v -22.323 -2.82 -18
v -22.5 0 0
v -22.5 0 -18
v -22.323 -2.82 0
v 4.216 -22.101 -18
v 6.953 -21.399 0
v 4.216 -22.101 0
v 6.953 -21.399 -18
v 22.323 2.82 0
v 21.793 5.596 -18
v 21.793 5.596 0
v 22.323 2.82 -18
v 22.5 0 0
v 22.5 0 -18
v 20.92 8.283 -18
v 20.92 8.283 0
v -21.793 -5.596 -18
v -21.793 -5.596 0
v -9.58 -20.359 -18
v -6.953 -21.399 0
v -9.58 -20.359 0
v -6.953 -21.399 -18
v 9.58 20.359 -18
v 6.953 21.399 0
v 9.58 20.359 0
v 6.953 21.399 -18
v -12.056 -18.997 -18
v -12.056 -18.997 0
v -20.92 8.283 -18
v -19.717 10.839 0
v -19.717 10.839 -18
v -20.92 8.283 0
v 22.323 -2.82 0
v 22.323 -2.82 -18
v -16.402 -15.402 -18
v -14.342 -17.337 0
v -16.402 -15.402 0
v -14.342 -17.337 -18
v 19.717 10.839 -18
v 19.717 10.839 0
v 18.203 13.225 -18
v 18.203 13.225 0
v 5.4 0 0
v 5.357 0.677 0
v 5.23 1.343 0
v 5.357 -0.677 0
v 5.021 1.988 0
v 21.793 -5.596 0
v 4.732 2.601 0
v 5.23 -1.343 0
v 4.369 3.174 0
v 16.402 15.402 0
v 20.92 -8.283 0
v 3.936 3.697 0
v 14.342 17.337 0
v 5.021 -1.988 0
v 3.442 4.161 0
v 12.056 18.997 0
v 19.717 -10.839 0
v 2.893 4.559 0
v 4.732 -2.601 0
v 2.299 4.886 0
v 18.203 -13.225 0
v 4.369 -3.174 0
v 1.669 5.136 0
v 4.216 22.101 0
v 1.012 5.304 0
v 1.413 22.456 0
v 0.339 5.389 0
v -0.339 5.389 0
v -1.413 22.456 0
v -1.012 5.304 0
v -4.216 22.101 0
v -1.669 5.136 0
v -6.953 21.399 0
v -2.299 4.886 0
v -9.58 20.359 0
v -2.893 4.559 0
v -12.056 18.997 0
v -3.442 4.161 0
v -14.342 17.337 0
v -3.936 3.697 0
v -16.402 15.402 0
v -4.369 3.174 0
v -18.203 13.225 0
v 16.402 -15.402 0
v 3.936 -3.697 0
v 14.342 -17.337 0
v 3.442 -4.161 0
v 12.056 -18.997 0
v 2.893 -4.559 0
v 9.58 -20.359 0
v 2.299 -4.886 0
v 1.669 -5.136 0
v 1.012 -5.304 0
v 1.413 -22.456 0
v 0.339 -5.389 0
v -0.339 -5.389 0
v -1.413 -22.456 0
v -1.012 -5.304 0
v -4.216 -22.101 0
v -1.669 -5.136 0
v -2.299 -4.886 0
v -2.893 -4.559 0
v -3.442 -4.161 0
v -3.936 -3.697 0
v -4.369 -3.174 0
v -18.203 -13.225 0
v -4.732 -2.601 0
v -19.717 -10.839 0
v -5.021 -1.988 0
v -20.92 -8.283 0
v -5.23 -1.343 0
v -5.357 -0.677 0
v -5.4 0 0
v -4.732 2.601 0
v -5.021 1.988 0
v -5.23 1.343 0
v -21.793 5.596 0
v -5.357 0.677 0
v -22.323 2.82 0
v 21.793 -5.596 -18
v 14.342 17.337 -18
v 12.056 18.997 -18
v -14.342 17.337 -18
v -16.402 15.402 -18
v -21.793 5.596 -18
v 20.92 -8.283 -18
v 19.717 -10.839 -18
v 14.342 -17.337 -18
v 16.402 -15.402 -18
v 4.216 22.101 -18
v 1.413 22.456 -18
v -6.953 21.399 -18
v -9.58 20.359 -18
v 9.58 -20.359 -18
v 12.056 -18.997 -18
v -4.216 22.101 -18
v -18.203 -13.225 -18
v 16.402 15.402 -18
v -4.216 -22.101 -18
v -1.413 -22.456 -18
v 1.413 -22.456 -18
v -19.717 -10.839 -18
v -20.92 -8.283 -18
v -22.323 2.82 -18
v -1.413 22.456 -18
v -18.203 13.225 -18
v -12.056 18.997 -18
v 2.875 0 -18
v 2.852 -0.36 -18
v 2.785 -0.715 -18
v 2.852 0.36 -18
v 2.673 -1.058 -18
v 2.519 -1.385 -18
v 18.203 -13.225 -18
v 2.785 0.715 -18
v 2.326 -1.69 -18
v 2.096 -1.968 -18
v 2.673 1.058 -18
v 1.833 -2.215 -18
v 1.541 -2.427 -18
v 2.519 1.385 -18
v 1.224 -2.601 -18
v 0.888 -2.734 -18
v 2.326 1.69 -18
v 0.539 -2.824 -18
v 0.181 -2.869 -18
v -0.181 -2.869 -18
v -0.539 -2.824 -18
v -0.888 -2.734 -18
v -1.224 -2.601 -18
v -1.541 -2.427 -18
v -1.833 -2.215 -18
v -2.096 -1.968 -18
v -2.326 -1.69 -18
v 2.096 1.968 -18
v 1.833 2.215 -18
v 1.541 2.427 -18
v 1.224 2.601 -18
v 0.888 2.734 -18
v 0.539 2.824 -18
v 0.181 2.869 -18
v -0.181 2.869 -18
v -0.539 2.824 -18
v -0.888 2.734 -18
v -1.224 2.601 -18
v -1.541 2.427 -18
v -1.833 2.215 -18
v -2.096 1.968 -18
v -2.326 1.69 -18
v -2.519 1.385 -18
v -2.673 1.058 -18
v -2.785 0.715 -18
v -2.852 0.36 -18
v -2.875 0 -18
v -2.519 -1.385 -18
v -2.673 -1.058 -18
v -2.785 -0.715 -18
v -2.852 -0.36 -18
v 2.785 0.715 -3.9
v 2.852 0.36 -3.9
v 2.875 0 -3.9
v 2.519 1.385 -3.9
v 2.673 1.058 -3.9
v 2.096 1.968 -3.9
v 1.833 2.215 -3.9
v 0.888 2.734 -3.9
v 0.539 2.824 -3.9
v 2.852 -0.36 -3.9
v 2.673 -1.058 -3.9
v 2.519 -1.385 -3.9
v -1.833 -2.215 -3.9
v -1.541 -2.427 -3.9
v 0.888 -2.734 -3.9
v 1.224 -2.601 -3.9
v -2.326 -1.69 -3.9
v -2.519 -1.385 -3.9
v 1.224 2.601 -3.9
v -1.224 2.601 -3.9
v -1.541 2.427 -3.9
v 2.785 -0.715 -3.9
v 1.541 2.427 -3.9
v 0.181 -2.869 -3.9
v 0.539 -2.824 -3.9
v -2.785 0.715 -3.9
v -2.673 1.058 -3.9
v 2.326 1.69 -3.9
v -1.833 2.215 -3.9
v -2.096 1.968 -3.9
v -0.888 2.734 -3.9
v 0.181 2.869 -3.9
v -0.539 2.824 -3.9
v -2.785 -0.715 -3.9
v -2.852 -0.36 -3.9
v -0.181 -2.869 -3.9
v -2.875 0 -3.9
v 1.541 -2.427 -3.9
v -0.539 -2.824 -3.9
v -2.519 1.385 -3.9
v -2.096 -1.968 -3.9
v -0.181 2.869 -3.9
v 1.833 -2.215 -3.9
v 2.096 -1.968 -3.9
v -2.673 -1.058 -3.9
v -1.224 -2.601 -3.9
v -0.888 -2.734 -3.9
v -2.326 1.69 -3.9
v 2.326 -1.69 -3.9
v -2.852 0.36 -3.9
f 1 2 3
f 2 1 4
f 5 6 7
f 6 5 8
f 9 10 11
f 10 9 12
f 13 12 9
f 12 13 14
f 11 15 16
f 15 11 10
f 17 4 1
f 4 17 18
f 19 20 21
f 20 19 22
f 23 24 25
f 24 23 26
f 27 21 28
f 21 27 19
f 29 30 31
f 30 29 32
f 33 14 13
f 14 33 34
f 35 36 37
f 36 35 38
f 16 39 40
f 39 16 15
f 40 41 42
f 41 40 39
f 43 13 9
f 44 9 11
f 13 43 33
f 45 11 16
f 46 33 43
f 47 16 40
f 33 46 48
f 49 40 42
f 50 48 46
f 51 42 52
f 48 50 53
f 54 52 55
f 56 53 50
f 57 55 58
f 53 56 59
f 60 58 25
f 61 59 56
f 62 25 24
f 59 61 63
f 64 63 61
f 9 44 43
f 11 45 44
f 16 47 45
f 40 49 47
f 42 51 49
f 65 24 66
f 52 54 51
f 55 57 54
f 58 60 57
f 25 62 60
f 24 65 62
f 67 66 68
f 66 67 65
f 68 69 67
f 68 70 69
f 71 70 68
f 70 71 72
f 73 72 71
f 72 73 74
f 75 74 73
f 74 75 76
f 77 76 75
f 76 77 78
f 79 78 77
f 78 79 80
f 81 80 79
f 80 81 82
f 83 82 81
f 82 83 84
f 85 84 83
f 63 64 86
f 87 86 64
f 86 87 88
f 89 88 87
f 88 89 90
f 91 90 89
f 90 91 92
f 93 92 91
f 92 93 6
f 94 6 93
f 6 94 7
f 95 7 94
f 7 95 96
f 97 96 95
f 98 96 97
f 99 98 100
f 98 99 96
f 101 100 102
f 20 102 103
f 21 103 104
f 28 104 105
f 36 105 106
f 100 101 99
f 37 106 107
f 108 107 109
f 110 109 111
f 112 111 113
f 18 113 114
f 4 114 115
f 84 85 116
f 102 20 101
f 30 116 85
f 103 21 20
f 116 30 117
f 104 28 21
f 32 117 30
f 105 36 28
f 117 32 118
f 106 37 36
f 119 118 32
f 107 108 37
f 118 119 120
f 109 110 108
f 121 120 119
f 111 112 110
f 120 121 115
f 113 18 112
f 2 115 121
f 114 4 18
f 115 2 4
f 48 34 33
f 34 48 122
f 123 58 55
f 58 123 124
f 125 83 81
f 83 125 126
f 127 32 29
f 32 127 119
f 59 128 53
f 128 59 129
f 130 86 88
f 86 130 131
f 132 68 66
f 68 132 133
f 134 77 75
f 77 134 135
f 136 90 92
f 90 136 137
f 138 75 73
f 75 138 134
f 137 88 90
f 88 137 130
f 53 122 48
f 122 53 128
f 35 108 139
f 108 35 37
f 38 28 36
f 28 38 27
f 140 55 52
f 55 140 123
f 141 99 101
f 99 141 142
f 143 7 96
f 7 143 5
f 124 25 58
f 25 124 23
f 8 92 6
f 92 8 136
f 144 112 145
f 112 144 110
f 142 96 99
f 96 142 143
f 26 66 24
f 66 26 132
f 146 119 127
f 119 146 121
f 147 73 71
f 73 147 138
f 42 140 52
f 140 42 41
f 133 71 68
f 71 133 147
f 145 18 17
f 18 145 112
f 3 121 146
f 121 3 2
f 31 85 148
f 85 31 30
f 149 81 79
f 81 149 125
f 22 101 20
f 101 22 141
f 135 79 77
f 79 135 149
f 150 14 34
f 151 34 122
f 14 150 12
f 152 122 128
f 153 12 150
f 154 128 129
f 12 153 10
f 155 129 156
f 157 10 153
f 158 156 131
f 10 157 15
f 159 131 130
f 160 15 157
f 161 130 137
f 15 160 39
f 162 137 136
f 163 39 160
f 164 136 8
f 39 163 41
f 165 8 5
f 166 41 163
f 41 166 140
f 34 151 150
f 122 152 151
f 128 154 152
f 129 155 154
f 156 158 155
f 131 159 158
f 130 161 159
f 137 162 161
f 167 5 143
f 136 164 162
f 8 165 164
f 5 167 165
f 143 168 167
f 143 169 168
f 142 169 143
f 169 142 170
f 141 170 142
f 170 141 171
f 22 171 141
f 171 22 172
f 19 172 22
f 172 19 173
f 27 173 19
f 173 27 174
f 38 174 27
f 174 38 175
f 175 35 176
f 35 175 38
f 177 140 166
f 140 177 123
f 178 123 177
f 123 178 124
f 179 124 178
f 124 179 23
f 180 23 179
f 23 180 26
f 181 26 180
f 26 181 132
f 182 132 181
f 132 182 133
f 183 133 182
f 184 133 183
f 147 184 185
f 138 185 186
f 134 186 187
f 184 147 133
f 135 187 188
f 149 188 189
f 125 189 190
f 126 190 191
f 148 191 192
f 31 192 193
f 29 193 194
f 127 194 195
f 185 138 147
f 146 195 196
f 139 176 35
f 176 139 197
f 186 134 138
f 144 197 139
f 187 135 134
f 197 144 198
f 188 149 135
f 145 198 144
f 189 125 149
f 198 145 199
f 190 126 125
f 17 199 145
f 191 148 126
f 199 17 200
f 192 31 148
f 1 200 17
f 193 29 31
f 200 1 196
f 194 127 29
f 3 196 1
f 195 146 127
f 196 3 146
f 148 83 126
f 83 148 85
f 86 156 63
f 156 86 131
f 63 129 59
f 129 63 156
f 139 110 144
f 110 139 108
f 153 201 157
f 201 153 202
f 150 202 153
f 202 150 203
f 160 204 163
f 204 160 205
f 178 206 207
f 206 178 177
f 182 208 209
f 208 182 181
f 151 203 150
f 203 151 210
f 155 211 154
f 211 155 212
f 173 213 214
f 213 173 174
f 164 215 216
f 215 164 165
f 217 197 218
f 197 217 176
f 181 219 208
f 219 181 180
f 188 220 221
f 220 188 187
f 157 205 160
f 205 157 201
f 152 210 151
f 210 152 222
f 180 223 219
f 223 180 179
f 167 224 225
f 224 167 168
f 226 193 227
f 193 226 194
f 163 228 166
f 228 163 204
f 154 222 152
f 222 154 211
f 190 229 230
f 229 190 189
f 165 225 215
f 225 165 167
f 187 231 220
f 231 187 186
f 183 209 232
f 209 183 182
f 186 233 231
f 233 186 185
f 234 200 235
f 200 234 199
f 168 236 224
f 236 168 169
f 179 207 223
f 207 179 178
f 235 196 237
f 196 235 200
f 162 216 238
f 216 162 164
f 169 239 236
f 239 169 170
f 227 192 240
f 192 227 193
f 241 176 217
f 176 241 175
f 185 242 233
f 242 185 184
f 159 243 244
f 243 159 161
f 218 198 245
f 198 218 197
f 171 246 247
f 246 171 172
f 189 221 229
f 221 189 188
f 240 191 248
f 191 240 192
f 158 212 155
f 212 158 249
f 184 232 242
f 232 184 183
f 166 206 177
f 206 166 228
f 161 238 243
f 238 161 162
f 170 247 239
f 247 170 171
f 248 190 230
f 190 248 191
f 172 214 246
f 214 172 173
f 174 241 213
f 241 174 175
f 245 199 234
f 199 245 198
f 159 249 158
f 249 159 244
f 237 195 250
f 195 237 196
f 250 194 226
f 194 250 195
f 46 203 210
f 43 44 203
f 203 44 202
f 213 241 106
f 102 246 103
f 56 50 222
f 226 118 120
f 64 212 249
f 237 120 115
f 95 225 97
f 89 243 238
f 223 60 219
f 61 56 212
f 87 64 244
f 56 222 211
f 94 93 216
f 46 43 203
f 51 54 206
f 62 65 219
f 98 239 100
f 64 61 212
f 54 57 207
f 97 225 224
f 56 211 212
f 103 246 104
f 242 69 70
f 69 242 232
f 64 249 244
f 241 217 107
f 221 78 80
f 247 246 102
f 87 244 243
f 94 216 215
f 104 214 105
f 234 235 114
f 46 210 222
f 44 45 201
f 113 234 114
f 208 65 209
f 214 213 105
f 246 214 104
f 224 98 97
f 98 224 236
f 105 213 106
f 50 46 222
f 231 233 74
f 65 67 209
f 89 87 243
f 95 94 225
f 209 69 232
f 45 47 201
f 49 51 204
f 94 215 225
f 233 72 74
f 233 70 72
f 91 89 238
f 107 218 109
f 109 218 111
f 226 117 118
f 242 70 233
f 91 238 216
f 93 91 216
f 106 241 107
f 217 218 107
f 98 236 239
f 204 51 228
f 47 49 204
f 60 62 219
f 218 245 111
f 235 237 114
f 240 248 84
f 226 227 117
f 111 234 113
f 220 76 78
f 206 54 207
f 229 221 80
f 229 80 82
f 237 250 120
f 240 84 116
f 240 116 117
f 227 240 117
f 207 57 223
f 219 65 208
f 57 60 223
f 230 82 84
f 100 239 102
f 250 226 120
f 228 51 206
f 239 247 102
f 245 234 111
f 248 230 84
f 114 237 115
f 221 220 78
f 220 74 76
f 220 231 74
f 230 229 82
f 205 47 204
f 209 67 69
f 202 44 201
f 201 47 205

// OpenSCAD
$fn = 50;

difference() {
	union() {
		translate(v = [0, 0, -18.0]) {
			cylinder(h = 18, r = 22.5);
		}
		#translate(v = [0, 0, -21.0]) {
			cylinder(h = 21, r = 2.875);
		}
	}
	union() {
		translate(v = [0, 0, 0]) {
			rotate(a = [0, 0, 0]) {
				difference() {
					union() {
						translate(v = [0, 0, -21.0]) {
							cylinder(h = 21, r = 2.6);
						}
						translate(v = [0, 0, -3.9]) {
							cylinder(h = 3.9, r1 = 2.875, r2 = 5.4);
						}
						translate(v = [0, 0, -21.0]) {
							cylinder(h = 21, r = 2.875);
						}
						translate(v = [0, 0, -21.0]) {
							cylinder(h = 21, r = 2.6);
						}
					}
					union();
				}
			}
		}
	}
}
